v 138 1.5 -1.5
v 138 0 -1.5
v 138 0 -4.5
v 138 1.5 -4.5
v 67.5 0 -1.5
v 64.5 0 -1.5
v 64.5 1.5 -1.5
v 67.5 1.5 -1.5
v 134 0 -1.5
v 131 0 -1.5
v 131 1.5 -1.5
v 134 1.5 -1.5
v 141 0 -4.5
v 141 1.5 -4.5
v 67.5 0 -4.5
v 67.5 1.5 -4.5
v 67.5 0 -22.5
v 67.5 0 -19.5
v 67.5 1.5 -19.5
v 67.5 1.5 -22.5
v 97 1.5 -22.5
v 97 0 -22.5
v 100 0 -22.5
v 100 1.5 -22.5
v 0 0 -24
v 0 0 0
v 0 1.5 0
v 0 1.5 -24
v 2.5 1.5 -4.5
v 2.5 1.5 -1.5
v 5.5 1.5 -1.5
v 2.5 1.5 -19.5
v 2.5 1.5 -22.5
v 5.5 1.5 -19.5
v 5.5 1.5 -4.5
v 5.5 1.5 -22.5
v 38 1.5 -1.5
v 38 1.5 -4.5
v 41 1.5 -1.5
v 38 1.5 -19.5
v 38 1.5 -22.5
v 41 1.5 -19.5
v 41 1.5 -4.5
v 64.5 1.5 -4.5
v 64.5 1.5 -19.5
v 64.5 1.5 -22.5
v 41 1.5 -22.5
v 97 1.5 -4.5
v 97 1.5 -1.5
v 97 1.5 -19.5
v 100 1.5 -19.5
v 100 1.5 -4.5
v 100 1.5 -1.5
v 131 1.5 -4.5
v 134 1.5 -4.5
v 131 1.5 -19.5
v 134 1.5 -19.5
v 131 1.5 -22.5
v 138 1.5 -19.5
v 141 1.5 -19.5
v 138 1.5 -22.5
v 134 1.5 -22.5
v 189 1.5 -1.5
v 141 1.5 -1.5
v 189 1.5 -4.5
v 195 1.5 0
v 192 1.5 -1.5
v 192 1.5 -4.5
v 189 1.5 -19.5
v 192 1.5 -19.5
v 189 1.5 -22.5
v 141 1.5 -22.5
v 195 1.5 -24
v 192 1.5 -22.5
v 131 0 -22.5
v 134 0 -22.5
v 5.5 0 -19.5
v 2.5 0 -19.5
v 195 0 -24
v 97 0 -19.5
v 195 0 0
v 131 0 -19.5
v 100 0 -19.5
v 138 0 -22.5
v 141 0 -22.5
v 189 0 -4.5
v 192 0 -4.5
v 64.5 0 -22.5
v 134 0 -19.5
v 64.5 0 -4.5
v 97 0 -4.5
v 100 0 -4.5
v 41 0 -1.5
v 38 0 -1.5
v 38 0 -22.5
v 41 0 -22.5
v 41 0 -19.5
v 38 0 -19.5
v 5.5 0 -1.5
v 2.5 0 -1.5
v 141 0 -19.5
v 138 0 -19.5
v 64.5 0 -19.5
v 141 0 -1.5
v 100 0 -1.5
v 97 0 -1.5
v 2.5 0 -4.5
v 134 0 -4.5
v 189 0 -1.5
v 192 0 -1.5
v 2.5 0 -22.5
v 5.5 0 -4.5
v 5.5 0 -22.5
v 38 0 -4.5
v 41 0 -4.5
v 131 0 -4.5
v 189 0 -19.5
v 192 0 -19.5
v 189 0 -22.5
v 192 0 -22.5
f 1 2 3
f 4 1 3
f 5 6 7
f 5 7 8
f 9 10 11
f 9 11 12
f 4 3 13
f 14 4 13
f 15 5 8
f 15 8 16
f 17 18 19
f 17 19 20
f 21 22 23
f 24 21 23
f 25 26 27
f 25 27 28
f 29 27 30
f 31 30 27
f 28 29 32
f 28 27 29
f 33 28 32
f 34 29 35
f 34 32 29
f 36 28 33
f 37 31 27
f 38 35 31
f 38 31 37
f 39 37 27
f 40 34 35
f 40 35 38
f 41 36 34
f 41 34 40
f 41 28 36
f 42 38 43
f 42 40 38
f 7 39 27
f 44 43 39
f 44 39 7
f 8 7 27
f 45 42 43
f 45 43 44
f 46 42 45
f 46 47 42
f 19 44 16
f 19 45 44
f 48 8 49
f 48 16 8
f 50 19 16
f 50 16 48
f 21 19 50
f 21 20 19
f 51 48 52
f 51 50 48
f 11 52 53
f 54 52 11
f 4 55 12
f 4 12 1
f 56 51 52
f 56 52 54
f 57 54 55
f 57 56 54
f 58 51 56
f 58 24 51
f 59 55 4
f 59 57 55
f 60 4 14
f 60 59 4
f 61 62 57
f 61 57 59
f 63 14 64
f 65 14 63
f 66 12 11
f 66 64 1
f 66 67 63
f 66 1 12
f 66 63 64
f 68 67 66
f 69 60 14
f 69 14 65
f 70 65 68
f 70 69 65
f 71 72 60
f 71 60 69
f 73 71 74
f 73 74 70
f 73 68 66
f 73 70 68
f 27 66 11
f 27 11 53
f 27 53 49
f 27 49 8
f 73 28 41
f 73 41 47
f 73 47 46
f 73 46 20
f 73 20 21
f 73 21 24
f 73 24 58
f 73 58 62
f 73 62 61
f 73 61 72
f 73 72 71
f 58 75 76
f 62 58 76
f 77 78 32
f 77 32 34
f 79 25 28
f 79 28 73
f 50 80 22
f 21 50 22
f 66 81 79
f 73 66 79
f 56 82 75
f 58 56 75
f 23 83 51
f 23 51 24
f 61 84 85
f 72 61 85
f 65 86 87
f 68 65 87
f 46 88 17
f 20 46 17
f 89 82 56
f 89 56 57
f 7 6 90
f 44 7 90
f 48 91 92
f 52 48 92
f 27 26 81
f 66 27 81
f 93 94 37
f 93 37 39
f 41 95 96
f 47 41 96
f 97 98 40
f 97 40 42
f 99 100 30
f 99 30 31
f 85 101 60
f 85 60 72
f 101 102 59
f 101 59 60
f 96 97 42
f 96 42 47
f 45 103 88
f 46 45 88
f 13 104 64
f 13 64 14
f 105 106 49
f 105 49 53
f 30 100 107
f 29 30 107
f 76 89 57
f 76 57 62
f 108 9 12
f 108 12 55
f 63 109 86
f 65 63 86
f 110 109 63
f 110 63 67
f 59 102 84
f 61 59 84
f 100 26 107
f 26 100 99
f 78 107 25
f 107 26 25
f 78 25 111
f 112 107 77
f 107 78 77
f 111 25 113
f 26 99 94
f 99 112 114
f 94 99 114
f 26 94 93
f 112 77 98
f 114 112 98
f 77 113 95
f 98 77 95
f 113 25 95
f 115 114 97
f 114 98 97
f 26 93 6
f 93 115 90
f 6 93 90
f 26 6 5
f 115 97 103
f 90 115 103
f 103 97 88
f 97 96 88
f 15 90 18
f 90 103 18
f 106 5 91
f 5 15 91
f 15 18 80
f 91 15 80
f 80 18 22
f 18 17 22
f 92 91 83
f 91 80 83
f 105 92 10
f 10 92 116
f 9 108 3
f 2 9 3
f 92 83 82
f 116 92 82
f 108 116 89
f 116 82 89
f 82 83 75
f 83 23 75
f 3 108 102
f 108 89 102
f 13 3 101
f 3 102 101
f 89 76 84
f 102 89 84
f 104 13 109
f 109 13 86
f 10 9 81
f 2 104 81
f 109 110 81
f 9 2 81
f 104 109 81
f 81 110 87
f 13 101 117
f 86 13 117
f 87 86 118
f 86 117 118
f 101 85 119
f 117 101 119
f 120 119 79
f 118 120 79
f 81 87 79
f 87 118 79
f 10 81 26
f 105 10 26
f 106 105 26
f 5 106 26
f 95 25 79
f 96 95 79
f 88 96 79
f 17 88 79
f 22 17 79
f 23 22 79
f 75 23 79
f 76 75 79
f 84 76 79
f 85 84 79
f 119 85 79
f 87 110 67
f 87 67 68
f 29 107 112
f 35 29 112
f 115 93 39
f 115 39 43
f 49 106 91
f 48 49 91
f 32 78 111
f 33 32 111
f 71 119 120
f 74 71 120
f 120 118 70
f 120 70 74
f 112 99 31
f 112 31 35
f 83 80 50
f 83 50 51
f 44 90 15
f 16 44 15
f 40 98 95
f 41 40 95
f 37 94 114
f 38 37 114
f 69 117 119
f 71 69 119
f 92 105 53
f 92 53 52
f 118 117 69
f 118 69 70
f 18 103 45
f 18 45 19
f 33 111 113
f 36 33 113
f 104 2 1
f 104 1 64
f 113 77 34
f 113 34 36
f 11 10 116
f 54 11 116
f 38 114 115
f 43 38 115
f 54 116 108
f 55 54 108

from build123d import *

# Parameters (mm, degrees)
SKETCH1_W           = 195
SKETCH1_H           = 24
SKETCH1_W_2         = 3
SKETCH1_H_2         = 3
BOSS_EXTRUDE1_DEPTH = 1.5


with BuildPart() as part:
    # Sketch1 → Boss-Extrude1 (new body)
    with BuildSketch(Plane(origin=(0, 0, 0), x_dir=(1, 0, 0), z_dir=(0, 1, 0))):
        with Locations((97.5, 12)):
            Rectangle(SKETCH1_W, SKETCH1_H)
        with Locations((66, 3)):
            Rectangle(SKETCH1_W_2, SKETCH1_H_2, mode=Mode.SUBTRACT)
        with Locations((4, 21)):
            Rectangle(SKETCH1_W_2, SKETCH1_H_2, mode=Mode.SUBTRACT)
        with Locations((39.5, 3)):
            Rectangle(SKETCH1_W_2, SKETCH1_H_2, mode=Mode.SUBTRACT)
        with Locations((98.5, 3)):
            Rectangle(SKETCH1_W_2, SKETCH1_H_2, mode=Mode.SUBTRACT)
        with Locations((139.5, 3)):
            Rectangle(SKETCH1_W_2, SKETCH1_H_2, mode=Mode.SUBTRACT)
        with Locations((139.5, 21)):
            Rectangle(SKETCH1_W_2, SKETCH1_H_2, mode=Mode.SUBTRACT)
        with Locations((132.5, 3)):
            Rectangle(SKETCH1_W_2, SKETCH1_H_2, mode=Mode.SUBTRACT)
        with Locations((132.5, 21)):
            Rectangle(SKETCH1_W_2, SKETCH1_H_2, mode=Mode.SUBTRACT)
        with Locations((66, 21)):
            Rectangle(SKETCH1_W_2, SKETCH1_H_2, mode=Mode.SUBTRACT)
        with Locations((98.5, 21)):
            Rectangle(SKETCH1_W_2, SKETCH1_H_2, mode=Mode.SUBTRACT)
        with Locations((39.5, 21)):
            Rectangle(SKETCH1_W_2, SKETCH1_H_2, mode=Mode.SUBTRACT)
        with Locations((4, 3)):
            Rectangle(SKETCH1_W_2, SKETCH1_H_2, mode=Mode.SUBTRACT)
        with Locations((190.5, 21)):
            Rectangle(SKETCH1_W_2, SKETCH1_H_2, mode=Mode.SUBTRACT)
        with Locations((190.5, 3)):
            Rectangle(SKETCH1_W_2, SKETCH1_H_2, mode=Mode.SUBTRACT)
    extrude(amount=BOSS_EXTRUDE1_DEPTH)


solid = part.part
